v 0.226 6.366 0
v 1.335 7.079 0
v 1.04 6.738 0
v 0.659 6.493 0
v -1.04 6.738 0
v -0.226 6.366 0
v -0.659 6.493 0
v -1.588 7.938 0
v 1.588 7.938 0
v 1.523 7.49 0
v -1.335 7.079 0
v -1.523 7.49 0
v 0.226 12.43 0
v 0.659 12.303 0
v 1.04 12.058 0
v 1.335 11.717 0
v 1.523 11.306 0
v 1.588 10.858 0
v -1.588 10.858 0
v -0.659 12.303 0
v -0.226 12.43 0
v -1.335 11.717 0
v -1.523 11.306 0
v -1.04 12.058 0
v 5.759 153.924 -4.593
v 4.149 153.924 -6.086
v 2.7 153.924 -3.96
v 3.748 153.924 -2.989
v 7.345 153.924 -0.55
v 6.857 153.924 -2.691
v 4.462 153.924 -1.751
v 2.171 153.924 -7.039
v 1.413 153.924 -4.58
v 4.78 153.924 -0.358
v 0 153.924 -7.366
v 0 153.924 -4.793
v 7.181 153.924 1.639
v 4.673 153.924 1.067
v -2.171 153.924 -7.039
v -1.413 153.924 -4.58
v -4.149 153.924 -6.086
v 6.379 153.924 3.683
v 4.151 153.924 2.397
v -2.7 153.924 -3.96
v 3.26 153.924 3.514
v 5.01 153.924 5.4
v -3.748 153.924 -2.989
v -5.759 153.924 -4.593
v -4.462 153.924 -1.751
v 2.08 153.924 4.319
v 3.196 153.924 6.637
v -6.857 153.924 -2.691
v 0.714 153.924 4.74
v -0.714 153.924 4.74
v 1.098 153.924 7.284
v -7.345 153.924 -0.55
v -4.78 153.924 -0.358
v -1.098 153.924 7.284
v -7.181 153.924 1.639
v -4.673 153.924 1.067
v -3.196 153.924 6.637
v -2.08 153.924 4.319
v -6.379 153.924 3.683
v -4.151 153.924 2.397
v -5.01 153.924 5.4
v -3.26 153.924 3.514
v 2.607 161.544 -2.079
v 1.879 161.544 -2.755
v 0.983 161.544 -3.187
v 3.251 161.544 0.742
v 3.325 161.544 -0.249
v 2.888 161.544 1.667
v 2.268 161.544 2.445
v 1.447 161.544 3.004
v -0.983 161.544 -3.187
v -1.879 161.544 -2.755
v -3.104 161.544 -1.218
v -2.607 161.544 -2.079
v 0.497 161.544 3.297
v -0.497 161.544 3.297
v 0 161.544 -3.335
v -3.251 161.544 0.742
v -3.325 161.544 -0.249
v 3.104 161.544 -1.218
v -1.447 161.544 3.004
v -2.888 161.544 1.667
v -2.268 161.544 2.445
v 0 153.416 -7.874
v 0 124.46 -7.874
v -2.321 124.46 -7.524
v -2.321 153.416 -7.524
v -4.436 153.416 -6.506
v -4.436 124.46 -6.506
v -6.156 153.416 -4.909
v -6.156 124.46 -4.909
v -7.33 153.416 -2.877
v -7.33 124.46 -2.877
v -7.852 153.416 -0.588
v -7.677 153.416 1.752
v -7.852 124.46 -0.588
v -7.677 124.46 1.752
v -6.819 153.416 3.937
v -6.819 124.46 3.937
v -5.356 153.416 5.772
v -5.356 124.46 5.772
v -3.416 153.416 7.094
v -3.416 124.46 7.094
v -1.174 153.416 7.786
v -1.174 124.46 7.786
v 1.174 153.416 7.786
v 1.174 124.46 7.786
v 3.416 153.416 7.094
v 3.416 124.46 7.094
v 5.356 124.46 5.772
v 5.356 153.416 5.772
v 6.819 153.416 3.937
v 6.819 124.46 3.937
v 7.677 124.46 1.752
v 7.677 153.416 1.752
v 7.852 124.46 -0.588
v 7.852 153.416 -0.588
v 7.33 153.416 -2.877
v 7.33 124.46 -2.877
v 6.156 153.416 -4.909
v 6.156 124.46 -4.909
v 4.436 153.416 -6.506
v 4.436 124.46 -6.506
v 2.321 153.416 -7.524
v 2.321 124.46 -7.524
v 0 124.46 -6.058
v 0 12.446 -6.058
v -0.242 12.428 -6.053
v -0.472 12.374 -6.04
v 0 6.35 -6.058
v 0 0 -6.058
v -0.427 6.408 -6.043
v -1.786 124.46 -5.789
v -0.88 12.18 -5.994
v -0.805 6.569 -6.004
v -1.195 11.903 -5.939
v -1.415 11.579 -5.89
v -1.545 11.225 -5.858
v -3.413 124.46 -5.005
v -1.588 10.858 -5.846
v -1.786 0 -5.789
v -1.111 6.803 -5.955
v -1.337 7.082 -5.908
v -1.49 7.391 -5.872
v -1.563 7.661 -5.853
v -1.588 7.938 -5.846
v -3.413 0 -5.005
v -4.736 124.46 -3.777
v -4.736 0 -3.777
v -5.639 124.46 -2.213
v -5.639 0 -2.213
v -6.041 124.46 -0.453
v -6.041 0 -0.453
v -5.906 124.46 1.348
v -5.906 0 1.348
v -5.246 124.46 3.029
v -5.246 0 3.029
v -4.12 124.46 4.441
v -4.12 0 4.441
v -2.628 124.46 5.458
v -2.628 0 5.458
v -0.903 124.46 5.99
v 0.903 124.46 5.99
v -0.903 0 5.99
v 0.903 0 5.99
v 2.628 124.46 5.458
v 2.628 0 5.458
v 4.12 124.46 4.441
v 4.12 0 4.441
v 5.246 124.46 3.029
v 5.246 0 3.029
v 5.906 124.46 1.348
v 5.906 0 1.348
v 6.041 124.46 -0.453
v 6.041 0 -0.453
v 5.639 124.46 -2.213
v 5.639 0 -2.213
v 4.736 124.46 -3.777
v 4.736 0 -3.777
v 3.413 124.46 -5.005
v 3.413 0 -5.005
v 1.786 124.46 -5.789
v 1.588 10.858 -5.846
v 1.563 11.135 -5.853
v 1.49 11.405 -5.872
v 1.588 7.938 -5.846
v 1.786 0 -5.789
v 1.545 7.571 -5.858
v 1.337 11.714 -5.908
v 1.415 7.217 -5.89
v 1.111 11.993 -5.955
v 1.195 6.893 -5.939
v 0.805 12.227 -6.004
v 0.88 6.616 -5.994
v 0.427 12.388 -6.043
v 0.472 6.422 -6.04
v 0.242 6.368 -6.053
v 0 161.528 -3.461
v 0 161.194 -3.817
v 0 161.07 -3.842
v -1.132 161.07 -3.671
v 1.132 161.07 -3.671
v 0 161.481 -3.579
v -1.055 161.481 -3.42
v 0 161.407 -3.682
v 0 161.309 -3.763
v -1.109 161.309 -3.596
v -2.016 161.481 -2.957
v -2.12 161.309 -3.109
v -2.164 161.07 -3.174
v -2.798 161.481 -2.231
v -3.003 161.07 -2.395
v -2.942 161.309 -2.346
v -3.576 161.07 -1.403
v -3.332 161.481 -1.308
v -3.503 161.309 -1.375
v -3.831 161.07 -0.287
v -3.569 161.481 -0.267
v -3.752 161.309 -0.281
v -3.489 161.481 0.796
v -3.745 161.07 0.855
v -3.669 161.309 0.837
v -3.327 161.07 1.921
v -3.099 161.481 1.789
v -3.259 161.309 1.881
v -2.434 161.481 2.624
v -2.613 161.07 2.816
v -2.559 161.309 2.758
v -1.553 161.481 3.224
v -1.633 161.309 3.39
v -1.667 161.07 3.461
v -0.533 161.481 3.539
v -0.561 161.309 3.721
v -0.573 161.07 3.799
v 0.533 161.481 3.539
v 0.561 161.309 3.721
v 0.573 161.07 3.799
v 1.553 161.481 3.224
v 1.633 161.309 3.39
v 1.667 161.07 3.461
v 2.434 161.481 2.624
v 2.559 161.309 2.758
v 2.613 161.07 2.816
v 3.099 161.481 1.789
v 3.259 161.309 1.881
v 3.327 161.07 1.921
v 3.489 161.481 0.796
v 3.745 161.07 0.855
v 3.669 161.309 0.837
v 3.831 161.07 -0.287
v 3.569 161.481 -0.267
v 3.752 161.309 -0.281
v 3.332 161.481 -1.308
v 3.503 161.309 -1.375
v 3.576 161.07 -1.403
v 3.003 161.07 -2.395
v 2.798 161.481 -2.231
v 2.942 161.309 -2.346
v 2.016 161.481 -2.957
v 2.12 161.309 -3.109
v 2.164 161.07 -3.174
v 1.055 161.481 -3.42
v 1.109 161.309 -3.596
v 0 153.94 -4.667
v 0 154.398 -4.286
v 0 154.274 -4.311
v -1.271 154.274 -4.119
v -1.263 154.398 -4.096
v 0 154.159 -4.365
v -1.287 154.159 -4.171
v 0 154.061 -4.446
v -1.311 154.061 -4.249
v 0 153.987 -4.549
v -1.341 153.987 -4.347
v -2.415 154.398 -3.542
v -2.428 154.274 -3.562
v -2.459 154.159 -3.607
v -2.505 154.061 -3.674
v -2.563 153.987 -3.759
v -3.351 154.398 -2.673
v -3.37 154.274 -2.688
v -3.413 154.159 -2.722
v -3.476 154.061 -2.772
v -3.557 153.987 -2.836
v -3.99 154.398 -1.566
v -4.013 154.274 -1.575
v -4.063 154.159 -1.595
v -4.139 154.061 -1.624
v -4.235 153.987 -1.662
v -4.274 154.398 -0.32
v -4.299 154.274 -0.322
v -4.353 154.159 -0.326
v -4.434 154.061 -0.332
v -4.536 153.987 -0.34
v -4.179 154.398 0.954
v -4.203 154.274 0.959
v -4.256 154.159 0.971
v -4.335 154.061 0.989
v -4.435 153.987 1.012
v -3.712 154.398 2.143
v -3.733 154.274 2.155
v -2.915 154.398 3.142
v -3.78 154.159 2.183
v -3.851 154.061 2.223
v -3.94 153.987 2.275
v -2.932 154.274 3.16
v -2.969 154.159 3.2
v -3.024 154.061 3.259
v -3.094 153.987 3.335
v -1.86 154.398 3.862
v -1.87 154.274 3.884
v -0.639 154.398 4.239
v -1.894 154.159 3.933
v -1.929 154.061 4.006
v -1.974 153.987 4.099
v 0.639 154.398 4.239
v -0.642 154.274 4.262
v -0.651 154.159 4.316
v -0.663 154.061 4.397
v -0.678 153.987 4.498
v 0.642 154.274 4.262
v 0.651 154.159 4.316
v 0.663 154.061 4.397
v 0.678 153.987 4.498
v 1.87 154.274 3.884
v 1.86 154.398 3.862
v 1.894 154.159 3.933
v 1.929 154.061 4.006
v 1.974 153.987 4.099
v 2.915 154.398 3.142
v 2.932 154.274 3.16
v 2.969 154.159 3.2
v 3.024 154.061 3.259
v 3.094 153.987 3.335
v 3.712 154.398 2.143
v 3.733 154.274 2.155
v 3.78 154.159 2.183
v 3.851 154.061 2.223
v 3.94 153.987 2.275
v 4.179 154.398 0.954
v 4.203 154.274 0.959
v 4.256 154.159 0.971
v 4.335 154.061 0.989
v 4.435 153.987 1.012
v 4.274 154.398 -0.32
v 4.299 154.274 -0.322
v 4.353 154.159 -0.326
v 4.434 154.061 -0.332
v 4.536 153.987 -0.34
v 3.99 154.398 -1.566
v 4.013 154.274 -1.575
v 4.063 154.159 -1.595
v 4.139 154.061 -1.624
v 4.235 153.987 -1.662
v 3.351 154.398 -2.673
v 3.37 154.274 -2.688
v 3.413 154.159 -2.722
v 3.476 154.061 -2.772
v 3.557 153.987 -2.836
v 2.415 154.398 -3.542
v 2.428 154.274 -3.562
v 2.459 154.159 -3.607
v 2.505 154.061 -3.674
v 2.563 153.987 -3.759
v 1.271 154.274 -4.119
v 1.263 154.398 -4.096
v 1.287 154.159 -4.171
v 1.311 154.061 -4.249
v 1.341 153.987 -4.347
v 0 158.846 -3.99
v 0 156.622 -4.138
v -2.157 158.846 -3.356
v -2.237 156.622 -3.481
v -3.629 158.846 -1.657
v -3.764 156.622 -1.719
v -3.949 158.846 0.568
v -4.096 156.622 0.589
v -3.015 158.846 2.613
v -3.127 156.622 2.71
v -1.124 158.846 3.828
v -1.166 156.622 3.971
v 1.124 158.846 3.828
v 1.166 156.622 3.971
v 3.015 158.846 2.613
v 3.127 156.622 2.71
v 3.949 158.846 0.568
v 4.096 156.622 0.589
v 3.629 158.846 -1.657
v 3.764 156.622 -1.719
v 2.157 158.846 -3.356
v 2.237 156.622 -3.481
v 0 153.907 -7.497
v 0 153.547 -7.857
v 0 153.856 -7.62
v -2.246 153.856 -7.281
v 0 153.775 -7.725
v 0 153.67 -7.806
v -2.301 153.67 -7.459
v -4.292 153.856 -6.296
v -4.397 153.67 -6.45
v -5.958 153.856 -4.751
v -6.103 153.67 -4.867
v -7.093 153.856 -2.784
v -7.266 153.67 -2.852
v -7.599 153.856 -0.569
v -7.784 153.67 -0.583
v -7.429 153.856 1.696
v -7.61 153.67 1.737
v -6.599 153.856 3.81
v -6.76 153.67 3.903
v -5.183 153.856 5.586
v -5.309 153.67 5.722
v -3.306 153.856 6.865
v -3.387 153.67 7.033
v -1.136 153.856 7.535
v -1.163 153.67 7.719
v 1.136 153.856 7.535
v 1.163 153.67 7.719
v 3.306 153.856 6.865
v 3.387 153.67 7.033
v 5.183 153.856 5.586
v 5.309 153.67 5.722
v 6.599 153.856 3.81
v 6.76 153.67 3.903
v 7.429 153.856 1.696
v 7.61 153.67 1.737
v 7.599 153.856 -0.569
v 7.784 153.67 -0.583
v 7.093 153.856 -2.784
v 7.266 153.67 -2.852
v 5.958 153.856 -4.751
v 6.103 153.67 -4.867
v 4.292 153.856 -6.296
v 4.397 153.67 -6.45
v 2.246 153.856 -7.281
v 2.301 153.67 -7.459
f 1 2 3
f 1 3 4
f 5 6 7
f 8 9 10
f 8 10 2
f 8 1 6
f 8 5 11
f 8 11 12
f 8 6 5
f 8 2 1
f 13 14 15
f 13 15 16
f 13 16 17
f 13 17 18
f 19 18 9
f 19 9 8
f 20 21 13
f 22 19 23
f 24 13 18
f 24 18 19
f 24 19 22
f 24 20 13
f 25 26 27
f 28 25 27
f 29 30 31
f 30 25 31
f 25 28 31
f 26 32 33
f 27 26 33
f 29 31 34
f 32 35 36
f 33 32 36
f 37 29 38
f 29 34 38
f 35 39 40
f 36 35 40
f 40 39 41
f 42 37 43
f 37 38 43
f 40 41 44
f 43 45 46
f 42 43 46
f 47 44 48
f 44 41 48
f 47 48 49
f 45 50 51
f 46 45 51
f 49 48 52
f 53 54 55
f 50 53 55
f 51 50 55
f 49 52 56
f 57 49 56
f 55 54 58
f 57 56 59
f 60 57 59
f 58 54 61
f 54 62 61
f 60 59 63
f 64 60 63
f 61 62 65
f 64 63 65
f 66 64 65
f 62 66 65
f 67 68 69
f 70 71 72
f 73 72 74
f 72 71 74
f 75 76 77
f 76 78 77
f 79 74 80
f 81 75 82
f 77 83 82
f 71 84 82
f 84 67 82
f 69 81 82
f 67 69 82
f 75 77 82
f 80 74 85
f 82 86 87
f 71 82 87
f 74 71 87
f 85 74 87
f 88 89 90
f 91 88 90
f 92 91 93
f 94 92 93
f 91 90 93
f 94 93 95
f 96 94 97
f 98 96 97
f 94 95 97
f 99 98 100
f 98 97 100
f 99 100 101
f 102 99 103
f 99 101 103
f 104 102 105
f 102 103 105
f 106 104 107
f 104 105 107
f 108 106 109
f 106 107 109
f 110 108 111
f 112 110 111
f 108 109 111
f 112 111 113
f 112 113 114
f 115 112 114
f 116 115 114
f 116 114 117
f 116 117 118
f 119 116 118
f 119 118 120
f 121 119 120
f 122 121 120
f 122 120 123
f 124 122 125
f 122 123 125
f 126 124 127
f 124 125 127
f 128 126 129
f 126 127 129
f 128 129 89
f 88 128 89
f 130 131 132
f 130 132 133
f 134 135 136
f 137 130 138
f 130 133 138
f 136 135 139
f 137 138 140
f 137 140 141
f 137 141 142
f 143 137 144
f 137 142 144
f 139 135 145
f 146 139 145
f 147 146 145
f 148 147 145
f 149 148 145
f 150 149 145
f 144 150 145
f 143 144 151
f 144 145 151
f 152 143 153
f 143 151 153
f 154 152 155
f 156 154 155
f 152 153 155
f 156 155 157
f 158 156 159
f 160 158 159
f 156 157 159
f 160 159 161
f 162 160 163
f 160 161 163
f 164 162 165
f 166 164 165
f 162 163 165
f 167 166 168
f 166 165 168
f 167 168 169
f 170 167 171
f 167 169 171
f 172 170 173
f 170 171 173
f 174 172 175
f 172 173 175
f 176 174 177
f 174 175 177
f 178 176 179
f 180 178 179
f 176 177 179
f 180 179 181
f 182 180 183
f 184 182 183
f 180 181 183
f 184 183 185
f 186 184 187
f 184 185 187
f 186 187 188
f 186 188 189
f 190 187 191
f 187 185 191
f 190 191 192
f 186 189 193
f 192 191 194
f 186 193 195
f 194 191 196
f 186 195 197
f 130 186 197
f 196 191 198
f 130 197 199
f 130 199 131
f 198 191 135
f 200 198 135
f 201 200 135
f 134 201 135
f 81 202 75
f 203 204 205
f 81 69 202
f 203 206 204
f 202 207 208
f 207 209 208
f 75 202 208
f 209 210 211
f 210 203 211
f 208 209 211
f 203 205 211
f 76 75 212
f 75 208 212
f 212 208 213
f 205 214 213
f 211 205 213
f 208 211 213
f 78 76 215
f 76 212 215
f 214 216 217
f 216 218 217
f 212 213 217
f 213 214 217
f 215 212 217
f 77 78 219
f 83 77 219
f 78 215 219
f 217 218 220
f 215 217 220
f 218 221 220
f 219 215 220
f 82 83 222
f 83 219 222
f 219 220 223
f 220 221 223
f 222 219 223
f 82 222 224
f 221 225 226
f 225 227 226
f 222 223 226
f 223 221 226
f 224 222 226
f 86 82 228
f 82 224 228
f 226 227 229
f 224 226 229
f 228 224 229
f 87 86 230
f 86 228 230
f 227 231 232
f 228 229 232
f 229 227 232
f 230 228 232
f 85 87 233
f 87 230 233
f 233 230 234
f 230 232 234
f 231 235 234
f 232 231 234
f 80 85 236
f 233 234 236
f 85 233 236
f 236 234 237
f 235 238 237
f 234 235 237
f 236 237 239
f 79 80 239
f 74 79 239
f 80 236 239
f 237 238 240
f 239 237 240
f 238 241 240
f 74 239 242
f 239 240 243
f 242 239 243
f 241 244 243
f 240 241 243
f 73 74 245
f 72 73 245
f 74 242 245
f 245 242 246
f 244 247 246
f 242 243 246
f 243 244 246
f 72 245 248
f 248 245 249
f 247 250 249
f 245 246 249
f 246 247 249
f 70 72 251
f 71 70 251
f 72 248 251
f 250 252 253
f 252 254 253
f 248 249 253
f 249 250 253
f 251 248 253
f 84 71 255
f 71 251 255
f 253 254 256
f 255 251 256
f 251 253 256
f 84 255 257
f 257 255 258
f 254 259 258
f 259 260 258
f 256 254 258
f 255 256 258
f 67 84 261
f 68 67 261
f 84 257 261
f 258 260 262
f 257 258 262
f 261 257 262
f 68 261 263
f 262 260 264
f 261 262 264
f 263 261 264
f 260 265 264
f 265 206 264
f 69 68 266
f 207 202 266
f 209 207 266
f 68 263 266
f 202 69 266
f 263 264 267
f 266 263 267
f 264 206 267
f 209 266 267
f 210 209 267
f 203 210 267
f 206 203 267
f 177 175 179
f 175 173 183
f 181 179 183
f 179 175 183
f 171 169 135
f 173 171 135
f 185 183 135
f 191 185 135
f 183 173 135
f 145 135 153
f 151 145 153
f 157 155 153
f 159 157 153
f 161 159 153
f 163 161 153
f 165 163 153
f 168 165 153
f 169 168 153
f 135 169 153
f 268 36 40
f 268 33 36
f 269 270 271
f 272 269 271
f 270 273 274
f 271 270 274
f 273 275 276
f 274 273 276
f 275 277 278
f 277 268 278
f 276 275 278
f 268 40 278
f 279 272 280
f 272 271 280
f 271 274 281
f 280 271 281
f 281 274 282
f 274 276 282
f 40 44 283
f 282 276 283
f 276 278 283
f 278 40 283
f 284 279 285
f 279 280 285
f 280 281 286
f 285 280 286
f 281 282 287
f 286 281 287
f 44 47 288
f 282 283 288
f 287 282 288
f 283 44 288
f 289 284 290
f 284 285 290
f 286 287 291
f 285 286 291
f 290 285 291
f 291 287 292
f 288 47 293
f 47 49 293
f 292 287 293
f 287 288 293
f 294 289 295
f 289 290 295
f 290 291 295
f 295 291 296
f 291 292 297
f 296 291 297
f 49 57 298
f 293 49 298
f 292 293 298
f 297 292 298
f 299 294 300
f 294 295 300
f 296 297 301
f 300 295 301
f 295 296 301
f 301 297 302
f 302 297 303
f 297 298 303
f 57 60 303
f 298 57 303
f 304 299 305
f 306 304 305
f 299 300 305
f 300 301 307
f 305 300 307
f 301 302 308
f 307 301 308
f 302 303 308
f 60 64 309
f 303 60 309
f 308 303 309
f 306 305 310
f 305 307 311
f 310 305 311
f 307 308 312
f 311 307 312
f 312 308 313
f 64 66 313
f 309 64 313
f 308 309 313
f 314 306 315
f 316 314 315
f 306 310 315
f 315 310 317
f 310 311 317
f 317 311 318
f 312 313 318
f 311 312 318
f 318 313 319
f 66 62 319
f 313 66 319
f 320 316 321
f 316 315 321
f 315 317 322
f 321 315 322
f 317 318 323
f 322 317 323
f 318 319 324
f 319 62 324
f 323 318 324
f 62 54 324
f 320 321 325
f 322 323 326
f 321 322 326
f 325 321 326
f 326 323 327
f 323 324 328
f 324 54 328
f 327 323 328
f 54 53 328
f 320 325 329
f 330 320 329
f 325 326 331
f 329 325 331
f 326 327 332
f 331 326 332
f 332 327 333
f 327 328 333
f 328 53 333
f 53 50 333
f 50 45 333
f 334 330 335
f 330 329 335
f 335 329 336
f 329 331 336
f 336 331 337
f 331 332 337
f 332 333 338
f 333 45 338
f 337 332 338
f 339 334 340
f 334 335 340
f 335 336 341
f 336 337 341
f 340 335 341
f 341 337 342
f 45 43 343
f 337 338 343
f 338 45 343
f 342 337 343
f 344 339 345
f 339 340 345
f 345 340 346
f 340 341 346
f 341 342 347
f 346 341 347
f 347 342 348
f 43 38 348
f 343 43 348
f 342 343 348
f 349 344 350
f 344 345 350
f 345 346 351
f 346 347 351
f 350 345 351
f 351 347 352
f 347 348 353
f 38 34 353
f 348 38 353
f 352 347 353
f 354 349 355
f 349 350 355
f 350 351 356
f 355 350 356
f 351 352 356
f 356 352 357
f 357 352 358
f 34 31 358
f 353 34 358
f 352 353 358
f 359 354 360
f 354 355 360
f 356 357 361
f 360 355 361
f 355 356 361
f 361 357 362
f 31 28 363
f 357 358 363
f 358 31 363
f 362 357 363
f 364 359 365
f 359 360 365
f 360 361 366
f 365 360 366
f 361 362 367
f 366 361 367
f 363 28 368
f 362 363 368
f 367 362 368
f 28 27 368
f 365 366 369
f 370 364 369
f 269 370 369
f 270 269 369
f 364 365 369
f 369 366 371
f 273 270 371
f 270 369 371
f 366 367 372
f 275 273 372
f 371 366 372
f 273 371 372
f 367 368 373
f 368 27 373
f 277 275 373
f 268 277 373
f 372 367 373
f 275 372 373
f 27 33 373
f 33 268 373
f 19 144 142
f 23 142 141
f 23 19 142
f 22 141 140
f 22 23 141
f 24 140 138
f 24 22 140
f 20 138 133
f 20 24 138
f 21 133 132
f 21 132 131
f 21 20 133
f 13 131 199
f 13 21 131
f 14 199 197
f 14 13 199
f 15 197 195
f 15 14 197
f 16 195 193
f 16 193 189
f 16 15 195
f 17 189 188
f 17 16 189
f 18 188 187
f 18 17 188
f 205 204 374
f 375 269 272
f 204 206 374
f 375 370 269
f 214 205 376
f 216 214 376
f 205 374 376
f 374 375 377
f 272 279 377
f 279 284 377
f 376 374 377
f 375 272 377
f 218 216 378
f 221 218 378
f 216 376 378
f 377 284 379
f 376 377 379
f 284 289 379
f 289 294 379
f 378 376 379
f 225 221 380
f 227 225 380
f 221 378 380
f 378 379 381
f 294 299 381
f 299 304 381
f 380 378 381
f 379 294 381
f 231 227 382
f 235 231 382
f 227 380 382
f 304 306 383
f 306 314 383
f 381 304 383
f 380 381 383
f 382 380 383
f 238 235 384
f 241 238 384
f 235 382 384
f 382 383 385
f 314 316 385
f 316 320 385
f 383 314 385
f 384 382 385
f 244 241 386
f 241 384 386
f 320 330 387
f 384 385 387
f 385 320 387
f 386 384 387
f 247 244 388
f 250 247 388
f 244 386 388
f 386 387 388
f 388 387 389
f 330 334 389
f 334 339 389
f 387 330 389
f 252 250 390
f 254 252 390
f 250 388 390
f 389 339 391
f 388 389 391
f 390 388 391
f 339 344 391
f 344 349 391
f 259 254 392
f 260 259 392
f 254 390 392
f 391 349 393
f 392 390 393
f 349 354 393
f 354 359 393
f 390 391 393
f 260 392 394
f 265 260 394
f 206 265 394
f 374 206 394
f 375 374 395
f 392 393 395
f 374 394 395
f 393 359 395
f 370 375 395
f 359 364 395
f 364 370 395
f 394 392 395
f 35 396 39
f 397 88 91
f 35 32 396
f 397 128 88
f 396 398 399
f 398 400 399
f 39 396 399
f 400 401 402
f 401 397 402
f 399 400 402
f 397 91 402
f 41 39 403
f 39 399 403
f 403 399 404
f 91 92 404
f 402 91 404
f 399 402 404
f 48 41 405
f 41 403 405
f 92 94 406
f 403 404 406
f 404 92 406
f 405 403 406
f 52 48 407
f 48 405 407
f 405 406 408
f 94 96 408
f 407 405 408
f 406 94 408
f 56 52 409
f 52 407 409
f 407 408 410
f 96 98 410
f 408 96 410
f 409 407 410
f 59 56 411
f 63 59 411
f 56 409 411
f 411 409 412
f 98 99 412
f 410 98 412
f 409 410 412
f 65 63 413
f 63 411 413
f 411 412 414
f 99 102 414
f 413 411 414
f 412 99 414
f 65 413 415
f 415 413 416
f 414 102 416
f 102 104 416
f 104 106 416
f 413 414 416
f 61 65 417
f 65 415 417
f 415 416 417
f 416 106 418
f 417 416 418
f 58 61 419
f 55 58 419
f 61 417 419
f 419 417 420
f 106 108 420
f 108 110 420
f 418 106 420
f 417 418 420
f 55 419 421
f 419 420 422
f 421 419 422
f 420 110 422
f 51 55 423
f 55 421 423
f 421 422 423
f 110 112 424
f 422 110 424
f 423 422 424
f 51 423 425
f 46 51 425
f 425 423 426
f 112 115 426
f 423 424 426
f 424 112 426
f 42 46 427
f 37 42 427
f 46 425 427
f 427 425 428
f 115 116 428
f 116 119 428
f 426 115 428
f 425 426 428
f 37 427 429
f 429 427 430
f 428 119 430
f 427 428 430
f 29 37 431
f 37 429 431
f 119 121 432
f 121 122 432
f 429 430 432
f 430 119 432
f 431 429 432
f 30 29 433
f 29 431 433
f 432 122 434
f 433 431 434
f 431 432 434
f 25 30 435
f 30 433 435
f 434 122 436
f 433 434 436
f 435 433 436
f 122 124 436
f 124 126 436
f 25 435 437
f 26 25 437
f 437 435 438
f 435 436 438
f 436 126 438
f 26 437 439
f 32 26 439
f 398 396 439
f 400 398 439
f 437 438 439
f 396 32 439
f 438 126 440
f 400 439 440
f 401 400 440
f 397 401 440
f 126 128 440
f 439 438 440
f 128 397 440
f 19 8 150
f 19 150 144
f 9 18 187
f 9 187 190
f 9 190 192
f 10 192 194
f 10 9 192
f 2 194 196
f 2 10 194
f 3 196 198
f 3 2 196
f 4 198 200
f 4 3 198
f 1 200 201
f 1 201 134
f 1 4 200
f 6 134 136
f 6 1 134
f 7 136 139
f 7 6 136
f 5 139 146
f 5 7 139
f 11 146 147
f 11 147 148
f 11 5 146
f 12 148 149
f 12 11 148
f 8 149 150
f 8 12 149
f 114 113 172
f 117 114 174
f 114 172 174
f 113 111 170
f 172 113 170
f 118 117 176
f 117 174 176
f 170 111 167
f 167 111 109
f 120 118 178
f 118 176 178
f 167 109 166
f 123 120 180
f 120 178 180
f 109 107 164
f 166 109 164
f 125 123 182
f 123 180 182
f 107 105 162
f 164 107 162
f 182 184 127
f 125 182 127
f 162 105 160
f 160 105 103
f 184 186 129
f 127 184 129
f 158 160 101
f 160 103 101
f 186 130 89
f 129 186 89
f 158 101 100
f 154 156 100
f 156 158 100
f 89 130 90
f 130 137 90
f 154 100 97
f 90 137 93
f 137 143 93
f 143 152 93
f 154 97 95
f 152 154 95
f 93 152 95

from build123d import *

# Parameters (mm, degrees)
CUT_EXTRUDE1_DEPTH = 162.927340767
FILLET1_R          = 0.508


with BuildPart() as part:
    # Sketch1 → Revolve1 (revolve)
    with BuildSketch(Plane.XY, mode=Mode.PRIVATE) as revolve1_sk:
        Polygon((0, 161.544), (3.81, 161.544), (4.318, 153.924), (7.874, 153.924), (7.874, 124.46), (6.0579, 124.46), (6.0579, 0), (0, 0), align=None)
    revolve(revolve1_sk.sketch.rotate(Axis((0, 0, 0), (0, 1, 0)), 90), axis=Axis((0, 0, 0), (0, 1, 0)))

    # Sketch2 → Cut-Extrude1 (cut, through all)
    with BuildSketch(Plane.XY):
        with BuildLine():
            Line((-1.5875, 7.9375), (-1.5875, 10.8585))
            ThreePointArc((-1.5875, 10.8585), (0, 12.446), (1.5875, 10.8585))
            Line((1.5875, 10.8585), (1.5875, 7.9375))
            ThreePointArc((1.5875, 7.9375), (0, 6.35), (-1.5875, 7.9375))
        make_face()
    extrude(amount=-CUT_EXTRUDE1_DEPTH, mode=Mode.SUBTRACT)

    # Fillet1
    fillet1_edges = [part.edges().sort_by_distance(p)[0] for p in [
        (0, 153.924, 7.874),
        (0, 153.924, 4.318),
        (0, 161.544, 3.81),
    ]]
    fillet(fillet1_edges, radius=FILLET1_R)


solid = part.part
